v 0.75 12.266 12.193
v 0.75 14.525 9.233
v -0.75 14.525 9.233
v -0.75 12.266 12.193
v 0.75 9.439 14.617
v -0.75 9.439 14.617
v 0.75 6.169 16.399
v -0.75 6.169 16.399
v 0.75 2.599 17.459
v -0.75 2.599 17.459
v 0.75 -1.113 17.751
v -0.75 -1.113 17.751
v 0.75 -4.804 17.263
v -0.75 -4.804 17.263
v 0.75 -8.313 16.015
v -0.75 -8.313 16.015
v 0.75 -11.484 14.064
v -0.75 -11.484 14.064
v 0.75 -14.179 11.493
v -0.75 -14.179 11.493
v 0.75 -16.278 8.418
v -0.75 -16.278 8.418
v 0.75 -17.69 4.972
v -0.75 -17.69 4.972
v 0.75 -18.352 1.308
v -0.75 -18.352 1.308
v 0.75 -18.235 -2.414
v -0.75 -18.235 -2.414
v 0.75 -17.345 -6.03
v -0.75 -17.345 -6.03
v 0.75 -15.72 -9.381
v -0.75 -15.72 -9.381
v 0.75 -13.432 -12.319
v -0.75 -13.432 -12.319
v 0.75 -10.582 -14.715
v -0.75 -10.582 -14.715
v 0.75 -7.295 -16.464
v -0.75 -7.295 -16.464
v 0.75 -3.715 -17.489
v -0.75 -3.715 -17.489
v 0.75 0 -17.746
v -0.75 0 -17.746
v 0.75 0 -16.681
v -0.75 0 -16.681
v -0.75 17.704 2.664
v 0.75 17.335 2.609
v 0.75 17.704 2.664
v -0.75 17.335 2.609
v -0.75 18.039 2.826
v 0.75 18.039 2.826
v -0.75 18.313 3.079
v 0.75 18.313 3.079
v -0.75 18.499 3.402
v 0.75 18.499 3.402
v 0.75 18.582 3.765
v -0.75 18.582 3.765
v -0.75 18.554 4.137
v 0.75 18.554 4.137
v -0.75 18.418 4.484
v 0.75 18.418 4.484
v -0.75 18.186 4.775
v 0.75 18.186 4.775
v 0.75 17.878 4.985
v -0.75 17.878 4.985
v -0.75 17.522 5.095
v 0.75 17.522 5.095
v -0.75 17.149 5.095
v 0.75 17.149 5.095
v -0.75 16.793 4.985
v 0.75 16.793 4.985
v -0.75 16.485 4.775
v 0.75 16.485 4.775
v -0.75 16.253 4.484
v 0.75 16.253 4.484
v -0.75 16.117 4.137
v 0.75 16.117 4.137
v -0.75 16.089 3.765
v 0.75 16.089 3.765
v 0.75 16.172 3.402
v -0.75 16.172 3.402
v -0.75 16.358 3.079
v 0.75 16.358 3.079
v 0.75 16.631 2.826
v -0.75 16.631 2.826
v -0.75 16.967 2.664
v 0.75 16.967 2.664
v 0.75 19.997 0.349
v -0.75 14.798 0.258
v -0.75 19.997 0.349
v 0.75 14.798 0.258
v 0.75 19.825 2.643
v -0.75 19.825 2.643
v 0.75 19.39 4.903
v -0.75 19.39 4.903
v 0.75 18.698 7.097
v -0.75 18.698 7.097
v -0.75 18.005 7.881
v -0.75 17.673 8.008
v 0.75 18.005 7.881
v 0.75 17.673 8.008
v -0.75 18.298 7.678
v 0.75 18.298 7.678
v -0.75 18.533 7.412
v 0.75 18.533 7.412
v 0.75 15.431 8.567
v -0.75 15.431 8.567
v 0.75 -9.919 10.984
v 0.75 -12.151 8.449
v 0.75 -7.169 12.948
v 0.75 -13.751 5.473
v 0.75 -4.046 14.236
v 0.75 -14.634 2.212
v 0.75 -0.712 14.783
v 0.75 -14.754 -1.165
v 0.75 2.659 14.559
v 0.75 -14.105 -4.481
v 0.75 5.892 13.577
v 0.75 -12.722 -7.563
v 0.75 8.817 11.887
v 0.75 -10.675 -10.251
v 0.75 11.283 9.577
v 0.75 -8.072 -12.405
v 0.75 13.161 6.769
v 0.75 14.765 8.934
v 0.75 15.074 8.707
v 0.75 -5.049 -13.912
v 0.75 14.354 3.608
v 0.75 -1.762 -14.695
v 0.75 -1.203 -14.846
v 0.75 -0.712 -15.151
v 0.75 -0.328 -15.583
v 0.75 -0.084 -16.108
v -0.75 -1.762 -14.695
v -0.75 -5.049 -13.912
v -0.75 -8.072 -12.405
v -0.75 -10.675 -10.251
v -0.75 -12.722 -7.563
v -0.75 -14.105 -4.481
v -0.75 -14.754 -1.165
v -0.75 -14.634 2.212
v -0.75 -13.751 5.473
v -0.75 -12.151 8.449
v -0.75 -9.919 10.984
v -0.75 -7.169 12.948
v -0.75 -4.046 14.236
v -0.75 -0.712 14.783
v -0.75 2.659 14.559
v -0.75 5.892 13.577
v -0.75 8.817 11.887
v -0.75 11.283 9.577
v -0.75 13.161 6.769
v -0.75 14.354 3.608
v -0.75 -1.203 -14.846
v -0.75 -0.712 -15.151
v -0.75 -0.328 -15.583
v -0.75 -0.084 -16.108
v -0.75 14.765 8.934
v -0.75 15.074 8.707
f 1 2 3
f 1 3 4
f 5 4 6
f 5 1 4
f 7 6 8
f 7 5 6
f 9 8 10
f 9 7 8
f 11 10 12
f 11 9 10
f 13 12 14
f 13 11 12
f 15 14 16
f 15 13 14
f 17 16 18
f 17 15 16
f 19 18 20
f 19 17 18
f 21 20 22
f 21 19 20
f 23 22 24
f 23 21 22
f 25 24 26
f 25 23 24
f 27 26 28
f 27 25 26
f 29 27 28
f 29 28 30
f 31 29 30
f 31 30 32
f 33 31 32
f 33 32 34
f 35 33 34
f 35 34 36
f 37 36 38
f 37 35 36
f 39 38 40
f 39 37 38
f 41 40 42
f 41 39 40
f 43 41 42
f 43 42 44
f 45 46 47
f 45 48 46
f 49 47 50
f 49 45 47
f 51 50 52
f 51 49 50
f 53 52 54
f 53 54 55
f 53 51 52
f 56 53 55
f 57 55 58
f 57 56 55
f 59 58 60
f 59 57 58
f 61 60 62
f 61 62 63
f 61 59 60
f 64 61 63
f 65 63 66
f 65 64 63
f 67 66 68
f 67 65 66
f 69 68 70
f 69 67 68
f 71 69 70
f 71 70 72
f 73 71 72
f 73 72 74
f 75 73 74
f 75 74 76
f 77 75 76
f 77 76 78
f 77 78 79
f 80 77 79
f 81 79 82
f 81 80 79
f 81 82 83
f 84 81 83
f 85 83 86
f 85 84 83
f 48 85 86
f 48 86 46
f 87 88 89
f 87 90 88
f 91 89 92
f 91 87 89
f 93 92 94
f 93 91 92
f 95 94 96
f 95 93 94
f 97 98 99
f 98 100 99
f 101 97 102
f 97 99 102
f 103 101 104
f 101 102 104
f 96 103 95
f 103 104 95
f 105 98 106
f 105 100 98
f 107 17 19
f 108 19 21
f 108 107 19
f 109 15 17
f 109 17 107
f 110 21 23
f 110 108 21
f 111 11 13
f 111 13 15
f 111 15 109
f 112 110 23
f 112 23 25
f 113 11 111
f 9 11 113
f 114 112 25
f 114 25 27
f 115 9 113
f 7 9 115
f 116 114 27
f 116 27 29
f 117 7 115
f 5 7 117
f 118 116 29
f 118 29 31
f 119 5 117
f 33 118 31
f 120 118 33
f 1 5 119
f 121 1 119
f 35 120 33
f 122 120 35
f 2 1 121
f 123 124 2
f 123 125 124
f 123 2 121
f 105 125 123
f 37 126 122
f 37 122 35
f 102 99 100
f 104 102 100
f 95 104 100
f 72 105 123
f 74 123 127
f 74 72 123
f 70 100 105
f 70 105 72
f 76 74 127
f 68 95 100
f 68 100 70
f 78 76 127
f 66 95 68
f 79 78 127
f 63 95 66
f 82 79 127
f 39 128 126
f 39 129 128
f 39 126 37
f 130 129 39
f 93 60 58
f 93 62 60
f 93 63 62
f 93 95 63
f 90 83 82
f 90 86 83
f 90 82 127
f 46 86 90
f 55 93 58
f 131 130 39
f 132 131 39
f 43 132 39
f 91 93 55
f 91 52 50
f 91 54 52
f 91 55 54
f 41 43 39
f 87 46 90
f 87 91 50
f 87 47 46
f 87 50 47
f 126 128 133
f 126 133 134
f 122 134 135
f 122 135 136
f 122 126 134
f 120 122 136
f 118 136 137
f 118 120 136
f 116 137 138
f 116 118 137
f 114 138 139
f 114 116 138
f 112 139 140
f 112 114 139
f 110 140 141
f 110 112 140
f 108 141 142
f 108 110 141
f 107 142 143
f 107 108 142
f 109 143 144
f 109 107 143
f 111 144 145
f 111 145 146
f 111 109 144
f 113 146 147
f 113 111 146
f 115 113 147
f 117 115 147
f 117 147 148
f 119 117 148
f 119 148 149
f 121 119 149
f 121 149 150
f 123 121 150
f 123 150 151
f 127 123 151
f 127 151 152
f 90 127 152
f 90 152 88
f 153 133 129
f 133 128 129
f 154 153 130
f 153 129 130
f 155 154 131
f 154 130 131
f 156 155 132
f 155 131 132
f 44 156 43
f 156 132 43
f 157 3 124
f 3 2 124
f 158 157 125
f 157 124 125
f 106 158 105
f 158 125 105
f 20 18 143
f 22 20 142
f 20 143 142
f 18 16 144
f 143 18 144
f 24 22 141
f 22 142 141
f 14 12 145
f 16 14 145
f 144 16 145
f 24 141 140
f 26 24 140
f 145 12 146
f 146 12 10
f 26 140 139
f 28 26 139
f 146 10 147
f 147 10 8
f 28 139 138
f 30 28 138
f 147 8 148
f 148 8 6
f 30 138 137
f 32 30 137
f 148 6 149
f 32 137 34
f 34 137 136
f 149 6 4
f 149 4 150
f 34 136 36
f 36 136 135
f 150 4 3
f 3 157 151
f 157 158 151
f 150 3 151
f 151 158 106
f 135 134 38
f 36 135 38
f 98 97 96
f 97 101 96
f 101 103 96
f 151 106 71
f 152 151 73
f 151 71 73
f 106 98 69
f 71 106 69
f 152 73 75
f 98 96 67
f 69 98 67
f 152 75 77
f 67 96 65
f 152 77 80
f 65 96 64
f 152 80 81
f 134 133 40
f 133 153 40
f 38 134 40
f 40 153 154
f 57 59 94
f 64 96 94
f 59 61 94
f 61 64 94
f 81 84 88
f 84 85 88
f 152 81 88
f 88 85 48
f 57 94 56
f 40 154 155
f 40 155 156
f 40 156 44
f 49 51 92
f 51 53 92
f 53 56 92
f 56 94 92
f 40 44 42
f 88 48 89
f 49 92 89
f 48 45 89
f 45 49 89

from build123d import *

# Parameters (mm, degrees)
SKETCH1_R          = 1.25
EXTRUDE1_DEPTH     = 0.75
FILLET1_R          = 1.48
CUT_EXTRUDE1_DEPTH = 2.5
FILLET2_R          = 2


with BuildPart() as part:
    # Sketch1 → Extrude1 (new body, symmetric)
    with BuildSketch(Plane(origin=(0, 0, 0), x_dir=(0, 0, -1), z_dir=(1, 0, 0))):
        with BuildLine():
            Line((-0.258295615, 14.797745888), (-0.349048129, 19.996953903))
            ThreePointArc((-0.349048129, 19.996953903), (-4.163801356, 19.561767769), (-7.825100504, 18.40564593))
            Line((-7.825100504, 18.40564593), (-8.717280741, 14.827306447))
            ThreePointArc((-8.717280741, 14.827306447), (0, -18.4), (8.717280741, 14.827306447))
            Line((8.717280741, 14.827306447), (7.825100504, 18.40564593))
            ThreePointArc((7.825100504, 18.40564593), (4.163801356, 19.561767769), (0.349048129, 19.996953903))
            Line((0.349048129, 19.996953903), (0.258295615, 14.797745888))
            ThreePointArc((0.258295615, 14.797745888), (0, -14.8), (-0.258295615, 14.797745888))
        make_face()
        with Locations((-3.85879125, 17.335295056)):
            Circle(SKETCH1_R, mode=Mode.SUBTRACT)
        with Locations((3.85879125, 17.335295056)):
            Circle(SKETCH1_R, mode=Mode.SUBTRACT)
    extrude(amount=EXTRUDE1_DEPTH, both=True)

    # Fillet1
    fillet1_edges = [part.edges().sort_by_distance(p)[0] for p in [
        (0, 18.40564593, -7.825100504),
        (0, 14.827306447, -8.717280741),
        (0, 14.827306447, 8.717280741),
        (0, 18.40564593, 7.825100504),
    ]]
    fillet(fillet1_edges, radius=FILLET1_R)

    # Sketch3 → Cut-Extrude1 (cut, through all)
    with BuildSketch(Plane(origin=(0.75, 0, 0), x_dir=(0, 0, -1), z_dir=(1, 0, 0))):
        Polygon((0, 0), (0, 37.659404293), (33.944851403, 0), align=None)
    extrude(amount=-CUT_EXTRUDE1_DEPTH, mode=Mode.SUBTRACT)

    # Fillet2
    fillet2_edges = [part.edges().sort_by_distance(p)[0] for p in [
        (0, 0, -14.8),
    ]]
    fillet(fillet2_edges, radius=FILLET2_R)


solid = part.part
